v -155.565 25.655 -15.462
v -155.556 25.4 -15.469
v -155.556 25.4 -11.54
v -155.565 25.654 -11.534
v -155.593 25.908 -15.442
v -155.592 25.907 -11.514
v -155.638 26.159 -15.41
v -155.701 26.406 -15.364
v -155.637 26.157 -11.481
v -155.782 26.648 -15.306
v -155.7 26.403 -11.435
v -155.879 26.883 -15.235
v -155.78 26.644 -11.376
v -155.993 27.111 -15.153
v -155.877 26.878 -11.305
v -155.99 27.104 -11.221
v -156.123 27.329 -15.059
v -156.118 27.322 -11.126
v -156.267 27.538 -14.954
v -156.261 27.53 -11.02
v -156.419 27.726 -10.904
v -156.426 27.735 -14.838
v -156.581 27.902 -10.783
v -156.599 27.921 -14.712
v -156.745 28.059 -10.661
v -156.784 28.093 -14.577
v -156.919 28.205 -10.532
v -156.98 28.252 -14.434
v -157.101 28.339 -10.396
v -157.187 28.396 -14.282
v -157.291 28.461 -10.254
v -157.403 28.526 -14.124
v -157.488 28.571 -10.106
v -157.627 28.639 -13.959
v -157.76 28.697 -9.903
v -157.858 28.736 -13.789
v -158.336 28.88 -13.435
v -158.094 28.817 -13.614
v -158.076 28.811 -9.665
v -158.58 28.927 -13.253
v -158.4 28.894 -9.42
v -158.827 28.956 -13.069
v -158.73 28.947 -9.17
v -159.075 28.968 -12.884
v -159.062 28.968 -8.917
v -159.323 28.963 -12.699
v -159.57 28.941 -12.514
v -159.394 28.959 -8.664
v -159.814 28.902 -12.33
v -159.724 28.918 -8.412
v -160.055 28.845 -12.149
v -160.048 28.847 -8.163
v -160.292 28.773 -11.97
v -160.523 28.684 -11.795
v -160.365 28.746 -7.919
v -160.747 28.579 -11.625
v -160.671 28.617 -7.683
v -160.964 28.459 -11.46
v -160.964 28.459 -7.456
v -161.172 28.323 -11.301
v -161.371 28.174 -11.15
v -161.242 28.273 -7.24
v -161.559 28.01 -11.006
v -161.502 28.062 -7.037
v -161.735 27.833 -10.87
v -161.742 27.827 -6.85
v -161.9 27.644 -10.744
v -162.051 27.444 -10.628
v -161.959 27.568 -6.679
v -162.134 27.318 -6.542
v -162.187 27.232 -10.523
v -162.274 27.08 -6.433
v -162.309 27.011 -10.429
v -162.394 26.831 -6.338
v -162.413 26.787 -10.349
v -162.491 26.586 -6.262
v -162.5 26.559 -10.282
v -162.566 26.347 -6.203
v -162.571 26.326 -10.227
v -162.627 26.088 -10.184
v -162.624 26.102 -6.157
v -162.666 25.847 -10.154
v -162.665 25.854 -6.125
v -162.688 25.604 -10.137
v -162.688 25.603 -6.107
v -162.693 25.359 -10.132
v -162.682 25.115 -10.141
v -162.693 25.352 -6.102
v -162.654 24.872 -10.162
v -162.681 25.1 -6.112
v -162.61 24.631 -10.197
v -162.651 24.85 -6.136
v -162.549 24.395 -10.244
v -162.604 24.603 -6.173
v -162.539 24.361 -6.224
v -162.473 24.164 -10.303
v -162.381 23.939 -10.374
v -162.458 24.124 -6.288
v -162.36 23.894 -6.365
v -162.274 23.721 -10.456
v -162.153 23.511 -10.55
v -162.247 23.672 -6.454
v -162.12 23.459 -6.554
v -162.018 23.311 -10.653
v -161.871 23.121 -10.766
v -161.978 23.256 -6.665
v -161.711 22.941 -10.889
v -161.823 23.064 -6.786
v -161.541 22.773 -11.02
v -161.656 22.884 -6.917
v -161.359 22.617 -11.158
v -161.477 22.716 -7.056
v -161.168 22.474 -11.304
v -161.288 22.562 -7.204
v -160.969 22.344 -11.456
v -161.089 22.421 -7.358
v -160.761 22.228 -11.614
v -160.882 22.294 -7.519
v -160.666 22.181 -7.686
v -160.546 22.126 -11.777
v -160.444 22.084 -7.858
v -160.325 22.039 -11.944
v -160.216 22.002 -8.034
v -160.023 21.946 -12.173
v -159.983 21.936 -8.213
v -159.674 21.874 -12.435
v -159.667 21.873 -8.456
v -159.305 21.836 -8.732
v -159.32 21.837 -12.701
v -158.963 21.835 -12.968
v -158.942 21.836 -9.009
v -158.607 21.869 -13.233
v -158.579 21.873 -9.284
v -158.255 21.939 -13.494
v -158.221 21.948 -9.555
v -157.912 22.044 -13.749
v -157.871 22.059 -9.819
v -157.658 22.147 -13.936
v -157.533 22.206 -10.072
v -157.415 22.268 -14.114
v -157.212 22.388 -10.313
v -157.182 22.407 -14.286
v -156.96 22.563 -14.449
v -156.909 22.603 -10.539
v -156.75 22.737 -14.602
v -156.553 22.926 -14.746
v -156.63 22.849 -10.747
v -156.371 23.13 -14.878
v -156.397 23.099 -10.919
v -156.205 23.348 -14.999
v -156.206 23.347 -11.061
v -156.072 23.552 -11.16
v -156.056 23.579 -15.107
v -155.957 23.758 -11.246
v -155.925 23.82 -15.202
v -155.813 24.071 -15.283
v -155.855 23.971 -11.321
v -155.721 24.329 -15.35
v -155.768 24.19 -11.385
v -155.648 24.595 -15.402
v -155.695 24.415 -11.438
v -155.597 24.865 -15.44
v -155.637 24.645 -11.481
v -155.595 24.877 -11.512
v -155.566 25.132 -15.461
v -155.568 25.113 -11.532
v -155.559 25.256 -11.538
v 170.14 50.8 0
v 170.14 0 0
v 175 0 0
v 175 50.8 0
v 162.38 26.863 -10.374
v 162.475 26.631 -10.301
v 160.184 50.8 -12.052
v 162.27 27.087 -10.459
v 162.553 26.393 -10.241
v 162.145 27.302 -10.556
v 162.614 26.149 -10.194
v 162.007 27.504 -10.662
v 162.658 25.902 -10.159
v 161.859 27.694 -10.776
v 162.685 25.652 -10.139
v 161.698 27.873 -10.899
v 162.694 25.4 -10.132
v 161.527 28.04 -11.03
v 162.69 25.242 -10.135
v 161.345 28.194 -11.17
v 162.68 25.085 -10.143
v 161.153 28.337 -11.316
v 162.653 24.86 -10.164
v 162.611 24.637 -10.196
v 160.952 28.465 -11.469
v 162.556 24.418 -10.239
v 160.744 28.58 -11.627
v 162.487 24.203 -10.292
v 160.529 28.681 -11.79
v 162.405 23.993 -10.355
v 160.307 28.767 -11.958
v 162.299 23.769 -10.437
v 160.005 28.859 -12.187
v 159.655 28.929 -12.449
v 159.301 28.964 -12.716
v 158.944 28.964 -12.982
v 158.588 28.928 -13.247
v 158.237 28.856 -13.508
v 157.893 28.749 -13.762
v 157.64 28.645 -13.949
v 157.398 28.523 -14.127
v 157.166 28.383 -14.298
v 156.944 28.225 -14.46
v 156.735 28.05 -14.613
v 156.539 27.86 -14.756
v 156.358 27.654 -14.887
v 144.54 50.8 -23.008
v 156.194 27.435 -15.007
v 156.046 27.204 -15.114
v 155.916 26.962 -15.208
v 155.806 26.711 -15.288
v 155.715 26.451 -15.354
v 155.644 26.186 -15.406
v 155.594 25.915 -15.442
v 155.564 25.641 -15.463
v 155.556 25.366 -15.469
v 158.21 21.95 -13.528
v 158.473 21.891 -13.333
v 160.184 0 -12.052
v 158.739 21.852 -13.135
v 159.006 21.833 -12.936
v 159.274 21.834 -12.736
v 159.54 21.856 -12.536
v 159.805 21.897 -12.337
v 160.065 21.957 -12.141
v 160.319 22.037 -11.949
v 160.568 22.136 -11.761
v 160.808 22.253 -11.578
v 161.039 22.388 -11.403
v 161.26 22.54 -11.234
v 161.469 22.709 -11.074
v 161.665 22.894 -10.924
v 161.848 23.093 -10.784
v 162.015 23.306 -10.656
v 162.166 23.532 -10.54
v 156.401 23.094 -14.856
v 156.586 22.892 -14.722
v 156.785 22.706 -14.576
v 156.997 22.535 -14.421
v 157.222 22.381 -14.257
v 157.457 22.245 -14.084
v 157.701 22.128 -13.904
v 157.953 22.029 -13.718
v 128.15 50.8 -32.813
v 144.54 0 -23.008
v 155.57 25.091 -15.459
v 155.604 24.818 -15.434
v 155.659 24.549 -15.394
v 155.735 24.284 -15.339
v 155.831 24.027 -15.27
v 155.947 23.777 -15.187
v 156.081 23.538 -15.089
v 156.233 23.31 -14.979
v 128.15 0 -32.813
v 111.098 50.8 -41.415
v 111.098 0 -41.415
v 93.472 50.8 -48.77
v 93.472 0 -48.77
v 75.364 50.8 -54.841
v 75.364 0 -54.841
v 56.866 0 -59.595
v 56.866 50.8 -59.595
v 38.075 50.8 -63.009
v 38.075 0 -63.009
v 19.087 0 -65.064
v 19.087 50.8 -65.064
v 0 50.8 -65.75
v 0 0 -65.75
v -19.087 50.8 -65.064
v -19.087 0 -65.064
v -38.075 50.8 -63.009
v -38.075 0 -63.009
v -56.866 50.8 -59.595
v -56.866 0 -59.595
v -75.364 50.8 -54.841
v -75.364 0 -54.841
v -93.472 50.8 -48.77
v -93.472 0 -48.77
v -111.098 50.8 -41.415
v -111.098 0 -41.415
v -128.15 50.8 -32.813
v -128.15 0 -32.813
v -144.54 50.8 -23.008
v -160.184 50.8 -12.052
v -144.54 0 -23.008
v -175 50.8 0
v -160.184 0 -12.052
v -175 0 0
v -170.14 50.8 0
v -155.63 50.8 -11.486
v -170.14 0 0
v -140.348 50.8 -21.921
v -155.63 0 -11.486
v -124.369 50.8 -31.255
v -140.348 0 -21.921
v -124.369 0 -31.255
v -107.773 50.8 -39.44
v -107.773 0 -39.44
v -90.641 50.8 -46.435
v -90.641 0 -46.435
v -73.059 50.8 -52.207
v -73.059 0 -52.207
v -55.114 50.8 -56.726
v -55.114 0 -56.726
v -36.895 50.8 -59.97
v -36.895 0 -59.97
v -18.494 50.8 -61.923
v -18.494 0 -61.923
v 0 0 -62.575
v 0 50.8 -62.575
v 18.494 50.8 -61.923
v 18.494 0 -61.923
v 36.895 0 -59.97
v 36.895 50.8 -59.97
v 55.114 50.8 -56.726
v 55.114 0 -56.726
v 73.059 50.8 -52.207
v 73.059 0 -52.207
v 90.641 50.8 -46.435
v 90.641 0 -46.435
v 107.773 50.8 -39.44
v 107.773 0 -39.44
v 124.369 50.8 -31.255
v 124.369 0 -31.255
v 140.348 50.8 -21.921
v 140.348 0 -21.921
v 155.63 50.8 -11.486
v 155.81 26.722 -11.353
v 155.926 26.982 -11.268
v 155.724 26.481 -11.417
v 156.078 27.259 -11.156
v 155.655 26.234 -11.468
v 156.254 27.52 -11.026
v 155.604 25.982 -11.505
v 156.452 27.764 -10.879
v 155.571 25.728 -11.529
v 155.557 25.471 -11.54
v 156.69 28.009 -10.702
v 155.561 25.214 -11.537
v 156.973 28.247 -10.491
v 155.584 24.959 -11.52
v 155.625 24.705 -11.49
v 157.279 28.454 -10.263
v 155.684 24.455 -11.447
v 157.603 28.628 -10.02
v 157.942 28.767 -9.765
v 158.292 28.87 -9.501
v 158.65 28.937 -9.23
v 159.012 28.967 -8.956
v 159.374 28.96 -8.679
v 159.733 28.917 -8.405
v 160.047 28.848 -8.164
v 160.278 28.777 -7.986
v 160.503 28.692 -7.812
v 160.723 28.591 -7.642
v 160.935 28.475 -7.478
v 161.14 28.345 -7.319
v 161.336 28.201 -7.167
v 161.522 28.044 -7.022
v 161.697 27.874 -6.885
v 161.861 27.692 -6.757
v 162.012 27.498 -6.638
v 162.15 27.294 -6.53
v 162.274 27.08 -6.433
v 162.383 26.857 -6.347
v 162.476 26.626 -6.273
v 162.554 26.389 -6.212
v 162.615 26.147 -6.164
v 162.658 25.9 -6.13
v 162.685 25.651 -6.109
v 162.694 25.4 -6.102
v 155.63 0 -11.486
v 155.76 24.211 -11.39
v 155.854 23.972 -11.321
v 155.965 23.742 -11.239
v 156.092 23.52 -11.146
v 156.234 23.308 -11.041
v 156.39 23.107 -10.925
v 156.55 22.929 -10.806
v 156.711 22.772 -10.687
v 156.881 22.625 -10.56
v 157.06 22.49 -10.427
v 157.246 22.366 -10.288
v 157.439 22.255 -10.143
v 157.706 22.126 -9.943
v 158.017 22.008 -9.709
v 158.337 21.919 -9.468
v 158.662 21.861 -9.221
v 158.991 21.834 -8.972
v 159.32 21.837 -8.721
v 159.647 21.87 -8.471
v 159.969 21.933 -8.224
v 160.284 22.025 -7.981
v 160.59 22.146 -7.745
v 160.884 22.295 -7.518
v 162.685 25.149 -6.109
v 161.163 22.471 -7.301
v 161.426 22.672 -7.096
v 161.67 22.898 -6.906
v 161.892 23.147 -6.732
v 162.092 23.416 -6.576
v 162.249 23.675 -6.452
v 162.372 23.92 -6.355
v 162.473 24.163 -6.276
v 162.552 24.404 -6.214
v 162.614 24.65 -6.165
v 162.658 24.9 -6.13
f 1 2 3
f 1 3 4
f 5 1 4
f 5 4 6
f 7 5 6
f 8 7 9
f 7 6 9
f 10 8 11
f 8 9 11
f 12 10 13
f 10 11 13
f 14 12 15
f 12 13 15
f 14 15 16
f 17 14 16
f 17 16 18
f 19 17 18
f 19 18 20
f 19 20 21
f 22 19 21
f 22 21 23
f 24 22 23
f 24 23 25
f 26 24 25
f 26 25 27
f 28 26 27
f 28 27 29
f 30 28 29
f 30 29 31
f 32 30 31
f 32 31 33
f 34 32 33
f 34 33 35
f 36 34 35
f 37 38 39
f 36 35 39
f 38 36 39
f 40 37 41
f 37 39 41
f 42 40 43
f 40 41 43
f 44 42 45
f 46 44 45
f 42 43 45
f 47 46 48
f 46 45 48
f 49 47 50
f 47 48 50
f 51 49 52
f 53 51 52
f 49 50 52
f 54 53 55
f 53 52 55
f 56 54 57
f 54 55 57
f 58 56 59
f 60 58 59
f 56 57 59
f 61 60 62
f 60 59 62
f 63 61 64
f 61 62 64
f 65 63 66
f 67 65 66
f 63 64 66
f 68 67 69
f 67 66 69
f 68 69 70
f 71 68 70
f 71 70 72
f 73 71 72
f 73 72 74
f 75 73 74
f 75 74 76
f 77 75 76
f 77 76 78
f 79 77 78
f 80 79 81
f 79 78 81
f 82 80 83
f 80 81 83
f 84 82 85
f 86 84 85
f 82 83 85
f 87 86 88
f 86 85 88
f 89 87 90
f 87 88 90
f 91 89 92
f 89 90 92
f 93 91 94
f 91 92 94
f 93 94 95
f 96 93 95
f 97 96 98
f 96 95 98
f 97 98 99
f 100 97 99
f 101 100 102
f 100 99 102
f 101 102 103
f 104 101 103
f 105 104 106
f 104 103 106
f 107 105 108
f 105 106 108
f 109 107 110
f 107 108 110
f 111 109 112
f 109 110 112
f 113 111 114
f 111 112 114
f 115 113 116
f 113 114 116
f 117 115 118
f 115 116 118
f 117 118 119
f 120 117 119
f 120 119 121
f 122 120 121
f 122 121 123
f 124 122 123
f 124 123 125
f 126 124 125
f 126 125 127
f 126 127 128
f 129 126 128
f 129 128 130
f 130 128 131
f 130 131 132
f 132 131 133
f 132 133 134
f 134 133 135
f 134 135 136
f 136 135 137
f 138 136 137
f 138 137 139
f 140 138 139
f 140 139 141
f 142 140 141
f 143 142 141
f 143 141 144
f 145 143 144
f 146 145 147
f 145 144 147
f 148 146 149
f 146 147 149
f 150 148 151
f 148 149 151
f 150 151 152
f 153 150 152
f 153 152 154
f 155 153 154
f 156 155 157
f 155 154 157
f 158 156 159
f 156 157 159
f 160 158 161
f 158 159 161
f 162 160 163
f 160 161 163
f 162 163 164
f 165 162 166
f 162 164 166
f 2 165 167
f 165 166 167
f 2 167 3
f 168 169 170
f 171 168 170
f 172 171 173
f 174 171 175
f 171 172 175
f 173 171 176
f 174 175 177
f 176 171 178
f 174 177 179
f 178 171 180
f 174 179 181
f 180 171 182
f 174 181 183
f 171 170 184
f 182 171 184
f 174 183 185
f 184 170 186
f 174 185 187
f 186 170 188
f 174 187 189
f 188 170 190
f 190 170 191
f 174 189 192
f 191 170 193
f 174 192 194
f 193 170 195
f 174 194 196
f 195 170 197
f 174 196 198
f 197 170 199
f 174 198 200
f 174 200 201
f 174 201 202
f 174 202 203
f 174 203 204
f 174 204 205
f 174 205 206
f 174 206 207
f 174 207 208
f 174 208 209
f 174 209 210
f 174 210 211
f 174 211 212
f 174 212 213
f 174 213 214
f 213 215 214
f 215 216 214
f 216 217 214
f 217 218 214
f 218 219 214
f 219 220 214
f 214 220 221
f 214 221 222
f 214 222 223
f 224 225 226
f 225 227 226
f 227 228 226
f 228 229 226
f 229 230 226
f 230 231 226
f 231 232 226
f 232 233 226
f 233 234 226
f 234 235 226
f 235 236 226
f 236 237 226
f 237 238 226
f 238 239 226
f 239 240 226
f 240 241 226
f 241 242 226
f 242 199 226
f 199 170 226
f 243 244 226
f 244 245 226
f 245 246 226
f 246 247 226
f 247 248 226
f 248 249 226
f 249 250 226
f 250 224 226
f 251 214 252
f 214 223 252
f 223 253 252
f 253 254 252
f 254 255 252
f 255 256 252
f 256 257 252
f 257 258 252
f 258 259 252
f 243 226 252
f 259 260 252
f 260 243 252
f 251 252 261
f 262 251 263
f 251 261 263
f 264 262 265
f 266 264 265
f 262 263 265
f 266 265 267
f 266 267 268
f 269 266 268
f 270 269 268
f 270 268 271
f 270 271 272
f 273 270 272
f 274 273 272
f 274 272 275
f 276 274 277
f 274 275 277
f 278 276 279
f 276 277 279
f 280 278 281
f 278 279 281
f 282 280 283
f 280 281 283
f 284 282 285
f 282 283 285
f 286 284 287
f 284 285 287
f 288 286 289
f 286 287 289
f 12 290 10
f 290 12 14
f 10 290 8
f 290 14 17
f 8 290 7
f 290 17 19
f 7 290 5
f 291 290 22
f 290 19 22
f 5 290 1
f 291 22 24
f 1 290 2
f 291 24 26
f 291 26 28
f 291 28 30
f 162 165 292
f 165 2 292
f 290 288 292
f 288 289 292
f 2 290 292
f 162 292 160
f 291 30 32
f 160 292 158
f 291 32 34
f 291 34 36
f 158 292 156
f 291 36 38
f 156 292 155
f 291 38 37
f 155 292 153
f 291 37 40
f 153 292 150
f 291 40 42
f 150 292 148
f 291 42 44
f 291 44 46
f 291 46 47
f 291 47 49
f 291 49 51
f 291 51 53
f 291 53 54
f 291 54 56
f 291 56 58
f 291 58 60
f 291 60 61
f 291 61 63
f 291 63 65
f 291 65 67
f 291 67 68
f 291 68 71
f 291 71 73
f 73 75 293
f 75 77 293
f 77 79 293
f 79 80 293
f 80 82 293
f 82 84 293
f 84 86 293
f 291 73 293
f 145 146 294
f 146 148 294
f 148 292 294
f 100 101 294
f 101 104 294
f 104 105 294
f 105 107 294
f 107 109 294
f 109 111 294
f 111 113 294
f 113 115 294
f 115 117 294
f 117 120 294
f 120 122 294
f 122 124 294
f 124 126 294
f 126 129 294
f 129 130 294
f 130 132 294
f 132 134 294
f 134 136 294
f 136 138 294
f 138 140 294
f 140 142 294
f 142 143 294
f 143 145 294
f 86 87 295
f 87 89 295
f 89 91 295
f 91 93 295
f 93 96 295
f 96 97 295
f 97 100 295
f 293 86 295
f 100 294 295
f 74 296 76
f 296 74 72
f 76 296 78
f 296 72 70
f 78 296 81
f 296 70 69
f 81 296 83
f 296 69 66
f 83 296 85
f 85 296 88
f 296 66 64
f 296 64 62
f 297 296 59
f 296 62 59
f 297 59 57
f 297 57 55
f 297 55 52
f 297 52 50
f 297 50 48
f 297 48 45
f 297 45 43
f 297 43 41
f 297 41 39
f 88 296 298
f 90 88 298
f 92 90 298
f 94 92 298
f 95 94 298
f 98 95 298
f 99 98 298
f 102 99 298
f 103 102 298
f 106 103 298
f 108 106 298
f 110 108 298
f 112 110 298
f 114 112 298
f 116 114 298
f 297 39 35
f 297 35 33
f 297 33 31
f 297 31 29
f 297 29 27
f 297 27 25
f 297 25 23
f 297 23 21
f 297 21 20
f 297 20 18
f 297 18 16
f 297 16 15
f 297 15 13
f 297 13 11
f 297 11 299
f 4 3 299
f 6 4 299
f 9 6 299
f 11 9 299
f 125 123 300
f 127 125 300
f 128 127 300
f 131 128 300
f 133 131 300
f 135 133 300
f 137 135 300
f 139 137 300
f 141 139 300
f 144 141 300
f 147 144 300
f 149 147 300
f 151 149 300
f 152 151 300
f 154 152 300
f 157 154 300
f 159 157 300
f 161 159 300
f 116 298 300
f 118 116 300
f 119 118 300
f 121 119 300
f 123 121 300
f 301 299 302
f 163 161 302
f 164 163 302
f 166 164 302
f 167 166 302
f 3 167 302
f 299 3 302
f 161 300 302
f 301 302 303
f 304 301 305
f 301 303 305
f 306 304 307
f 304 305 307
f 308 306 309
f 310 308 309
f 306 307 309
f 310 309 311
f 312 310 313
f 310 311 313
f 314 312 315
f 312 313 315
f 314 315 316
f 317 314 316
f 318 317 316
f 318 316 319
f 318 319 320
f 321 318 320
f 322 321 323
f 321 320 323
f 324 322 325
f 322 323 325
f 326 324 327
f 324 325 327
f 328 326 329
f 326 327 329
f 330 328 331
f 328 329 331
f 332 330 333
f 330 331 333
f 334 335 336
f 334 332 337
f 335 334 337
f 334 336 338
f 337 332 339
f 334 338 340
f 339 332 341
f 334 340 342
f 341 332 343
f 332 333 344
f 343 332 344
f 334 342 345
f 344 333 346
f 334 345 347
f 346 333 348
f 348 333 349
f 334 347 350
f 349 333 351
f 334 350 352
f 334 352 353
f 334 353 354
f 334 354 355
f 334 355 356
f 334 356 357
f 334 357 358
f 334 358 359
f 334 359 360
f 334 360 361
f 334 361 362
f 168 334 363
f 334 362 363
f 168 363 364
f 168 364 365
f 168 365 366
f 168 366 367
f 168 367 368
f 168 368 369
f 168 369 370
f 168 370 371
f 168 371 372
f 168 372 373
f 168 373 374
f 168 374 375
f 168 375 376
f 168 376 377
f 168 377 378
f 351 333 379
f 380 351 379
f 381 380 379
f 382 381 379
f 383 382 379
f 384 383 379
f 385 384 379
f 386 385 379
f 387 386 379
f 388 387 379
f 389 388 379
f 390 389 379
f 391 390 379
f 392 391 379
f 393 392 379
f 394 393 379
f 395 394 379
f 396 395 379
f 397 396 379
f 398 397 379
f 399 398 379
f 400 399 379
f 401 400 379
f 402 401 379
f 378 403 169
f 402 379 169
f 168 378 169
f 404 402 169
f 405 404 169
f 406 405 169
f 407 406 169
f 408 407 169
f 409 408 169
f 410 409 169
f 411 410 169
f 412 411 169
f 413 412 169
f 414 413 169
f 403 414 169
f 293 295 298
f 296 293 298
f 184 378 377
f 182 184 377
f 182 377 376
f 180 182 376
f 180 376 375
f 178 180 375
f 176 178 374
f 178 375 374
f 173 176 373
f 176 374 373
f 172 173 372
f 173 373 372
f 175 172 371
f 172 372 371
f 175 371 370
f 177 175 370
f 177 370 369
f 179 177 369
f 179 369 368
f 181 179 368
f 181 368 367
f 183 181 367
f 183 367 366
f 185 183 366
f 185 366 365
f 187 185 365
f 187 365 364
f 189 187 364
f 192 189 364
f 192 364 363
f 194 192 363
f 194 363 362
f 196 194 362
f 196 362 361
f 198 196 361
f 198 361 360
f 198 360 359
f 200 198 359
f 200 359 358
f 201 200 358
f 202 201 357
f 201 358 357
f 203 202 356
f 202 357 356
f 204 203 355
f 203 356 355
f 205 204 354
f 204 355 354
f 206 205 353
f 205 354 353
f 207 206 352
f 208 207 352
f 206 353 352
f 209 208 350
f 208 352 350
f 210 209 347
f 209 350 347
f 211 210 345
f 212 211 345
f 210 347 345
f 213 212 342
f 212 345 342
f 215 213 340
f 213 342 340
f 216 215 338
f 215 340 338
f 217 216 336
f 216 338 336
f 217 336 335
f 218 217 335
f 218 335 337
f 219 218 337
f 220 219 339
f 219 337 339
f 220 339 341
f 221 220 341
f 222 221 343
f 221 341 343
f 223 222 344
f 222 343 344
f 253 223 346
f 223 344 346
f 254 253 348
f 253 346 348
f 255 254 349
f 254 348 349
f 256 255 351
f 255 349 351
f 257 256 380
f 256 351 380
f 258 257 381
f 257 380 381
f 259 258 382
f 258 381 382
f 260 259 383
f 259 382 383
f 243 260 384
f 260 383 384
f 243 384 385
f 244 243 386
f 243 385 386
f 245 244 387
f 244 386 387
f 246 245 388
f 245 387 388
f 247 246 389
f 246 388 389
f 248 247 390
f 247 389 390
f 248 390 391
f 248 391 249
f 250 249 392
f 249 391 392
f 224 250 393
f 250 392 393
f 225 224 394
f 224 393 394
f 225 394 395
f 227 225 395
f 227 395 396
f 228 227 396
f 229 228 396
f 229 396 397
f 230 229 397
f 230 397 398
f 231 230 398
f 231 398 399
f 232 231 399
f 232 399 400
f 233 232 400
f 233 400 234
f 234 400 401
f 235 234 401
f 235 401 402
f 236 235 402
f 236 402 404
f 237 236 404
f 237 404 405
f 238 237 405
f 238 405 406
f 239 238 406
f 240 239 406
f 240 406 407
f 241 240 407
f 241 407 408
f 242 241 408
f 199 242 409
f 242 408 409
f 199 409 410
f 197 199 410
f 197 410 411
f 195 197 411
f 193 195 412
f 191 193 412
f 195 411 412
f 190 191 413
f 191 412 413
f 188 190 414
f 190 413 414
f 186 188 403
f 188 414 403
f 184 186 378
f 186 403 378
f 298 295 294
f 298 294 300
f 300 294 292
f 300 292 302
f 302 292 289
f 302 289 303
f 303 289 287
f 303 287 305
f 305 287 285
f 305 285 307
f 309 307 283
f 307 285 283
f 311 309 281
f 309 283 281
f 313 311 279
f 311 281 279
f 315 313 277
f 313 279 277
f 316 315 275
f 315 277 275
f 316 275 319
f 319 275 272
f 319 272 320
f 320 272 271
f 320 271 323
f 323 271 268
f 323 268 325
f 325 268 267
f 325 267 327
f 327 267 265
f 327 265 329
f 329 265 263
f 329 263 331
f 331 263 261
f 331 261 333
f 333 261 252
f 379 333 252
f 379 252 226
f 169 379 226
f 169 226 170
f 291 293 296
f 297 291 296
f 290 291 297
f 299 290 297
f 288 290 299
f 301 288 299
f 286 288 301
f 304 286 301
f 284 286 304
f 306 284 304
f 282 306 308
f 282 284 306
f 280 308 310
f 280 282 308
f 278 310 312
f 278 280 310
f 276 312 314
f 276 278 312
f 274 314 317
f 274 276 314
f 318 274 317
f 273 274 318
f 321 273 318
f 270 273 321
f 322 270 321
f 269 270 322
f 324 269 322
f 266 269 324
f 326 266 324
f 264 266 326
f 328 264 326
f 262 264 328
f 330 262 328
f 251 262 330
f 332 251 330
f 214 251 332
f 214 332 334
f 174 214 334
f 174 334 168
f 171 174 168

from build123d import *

# Parameters (mm, degrees)
CURVED_PLATE_DEPTH   = 50.8
SKETCH3_R            = 3.5687
MOUNTING_HOLES_DEPTH = 66.75


with BuildPart() as part:
    # Sketch1 → Curved Plate (new body)
    with BuildSketch(Plane(origin=(0, 0, 0), x_dir=(1, 0, 0), z_dir=(0, 1, 0))):
        with BuildLine():
            Line((170.139573777, 0), (175, 0))
            ThreePointArc((175, 0), (0, 65.75), (-175, 0))
            Line((-175, 0), (-170.139573777, 0))
            ThreePointArc((-170.139573777, 0), (0, 62.575), (170.139573777, 0))
        make_face()
    extrude(amount=CURVED_PLATE_DEPTH)

    # Sketch3 → Mounting Holes (cut, through all)
    with BuildSketch(Plane.XY):
        with Locations((-159.125, 25.4)):
            Circle(SKETCH3_R)
        with Locations((159.125, 25.4)):
            Circle(SKETCH3_R)
    extrude(amount=-MOUNTING_HOLES_DEPTH, mode=Mode.SUBTRACT)


solid = part.part
